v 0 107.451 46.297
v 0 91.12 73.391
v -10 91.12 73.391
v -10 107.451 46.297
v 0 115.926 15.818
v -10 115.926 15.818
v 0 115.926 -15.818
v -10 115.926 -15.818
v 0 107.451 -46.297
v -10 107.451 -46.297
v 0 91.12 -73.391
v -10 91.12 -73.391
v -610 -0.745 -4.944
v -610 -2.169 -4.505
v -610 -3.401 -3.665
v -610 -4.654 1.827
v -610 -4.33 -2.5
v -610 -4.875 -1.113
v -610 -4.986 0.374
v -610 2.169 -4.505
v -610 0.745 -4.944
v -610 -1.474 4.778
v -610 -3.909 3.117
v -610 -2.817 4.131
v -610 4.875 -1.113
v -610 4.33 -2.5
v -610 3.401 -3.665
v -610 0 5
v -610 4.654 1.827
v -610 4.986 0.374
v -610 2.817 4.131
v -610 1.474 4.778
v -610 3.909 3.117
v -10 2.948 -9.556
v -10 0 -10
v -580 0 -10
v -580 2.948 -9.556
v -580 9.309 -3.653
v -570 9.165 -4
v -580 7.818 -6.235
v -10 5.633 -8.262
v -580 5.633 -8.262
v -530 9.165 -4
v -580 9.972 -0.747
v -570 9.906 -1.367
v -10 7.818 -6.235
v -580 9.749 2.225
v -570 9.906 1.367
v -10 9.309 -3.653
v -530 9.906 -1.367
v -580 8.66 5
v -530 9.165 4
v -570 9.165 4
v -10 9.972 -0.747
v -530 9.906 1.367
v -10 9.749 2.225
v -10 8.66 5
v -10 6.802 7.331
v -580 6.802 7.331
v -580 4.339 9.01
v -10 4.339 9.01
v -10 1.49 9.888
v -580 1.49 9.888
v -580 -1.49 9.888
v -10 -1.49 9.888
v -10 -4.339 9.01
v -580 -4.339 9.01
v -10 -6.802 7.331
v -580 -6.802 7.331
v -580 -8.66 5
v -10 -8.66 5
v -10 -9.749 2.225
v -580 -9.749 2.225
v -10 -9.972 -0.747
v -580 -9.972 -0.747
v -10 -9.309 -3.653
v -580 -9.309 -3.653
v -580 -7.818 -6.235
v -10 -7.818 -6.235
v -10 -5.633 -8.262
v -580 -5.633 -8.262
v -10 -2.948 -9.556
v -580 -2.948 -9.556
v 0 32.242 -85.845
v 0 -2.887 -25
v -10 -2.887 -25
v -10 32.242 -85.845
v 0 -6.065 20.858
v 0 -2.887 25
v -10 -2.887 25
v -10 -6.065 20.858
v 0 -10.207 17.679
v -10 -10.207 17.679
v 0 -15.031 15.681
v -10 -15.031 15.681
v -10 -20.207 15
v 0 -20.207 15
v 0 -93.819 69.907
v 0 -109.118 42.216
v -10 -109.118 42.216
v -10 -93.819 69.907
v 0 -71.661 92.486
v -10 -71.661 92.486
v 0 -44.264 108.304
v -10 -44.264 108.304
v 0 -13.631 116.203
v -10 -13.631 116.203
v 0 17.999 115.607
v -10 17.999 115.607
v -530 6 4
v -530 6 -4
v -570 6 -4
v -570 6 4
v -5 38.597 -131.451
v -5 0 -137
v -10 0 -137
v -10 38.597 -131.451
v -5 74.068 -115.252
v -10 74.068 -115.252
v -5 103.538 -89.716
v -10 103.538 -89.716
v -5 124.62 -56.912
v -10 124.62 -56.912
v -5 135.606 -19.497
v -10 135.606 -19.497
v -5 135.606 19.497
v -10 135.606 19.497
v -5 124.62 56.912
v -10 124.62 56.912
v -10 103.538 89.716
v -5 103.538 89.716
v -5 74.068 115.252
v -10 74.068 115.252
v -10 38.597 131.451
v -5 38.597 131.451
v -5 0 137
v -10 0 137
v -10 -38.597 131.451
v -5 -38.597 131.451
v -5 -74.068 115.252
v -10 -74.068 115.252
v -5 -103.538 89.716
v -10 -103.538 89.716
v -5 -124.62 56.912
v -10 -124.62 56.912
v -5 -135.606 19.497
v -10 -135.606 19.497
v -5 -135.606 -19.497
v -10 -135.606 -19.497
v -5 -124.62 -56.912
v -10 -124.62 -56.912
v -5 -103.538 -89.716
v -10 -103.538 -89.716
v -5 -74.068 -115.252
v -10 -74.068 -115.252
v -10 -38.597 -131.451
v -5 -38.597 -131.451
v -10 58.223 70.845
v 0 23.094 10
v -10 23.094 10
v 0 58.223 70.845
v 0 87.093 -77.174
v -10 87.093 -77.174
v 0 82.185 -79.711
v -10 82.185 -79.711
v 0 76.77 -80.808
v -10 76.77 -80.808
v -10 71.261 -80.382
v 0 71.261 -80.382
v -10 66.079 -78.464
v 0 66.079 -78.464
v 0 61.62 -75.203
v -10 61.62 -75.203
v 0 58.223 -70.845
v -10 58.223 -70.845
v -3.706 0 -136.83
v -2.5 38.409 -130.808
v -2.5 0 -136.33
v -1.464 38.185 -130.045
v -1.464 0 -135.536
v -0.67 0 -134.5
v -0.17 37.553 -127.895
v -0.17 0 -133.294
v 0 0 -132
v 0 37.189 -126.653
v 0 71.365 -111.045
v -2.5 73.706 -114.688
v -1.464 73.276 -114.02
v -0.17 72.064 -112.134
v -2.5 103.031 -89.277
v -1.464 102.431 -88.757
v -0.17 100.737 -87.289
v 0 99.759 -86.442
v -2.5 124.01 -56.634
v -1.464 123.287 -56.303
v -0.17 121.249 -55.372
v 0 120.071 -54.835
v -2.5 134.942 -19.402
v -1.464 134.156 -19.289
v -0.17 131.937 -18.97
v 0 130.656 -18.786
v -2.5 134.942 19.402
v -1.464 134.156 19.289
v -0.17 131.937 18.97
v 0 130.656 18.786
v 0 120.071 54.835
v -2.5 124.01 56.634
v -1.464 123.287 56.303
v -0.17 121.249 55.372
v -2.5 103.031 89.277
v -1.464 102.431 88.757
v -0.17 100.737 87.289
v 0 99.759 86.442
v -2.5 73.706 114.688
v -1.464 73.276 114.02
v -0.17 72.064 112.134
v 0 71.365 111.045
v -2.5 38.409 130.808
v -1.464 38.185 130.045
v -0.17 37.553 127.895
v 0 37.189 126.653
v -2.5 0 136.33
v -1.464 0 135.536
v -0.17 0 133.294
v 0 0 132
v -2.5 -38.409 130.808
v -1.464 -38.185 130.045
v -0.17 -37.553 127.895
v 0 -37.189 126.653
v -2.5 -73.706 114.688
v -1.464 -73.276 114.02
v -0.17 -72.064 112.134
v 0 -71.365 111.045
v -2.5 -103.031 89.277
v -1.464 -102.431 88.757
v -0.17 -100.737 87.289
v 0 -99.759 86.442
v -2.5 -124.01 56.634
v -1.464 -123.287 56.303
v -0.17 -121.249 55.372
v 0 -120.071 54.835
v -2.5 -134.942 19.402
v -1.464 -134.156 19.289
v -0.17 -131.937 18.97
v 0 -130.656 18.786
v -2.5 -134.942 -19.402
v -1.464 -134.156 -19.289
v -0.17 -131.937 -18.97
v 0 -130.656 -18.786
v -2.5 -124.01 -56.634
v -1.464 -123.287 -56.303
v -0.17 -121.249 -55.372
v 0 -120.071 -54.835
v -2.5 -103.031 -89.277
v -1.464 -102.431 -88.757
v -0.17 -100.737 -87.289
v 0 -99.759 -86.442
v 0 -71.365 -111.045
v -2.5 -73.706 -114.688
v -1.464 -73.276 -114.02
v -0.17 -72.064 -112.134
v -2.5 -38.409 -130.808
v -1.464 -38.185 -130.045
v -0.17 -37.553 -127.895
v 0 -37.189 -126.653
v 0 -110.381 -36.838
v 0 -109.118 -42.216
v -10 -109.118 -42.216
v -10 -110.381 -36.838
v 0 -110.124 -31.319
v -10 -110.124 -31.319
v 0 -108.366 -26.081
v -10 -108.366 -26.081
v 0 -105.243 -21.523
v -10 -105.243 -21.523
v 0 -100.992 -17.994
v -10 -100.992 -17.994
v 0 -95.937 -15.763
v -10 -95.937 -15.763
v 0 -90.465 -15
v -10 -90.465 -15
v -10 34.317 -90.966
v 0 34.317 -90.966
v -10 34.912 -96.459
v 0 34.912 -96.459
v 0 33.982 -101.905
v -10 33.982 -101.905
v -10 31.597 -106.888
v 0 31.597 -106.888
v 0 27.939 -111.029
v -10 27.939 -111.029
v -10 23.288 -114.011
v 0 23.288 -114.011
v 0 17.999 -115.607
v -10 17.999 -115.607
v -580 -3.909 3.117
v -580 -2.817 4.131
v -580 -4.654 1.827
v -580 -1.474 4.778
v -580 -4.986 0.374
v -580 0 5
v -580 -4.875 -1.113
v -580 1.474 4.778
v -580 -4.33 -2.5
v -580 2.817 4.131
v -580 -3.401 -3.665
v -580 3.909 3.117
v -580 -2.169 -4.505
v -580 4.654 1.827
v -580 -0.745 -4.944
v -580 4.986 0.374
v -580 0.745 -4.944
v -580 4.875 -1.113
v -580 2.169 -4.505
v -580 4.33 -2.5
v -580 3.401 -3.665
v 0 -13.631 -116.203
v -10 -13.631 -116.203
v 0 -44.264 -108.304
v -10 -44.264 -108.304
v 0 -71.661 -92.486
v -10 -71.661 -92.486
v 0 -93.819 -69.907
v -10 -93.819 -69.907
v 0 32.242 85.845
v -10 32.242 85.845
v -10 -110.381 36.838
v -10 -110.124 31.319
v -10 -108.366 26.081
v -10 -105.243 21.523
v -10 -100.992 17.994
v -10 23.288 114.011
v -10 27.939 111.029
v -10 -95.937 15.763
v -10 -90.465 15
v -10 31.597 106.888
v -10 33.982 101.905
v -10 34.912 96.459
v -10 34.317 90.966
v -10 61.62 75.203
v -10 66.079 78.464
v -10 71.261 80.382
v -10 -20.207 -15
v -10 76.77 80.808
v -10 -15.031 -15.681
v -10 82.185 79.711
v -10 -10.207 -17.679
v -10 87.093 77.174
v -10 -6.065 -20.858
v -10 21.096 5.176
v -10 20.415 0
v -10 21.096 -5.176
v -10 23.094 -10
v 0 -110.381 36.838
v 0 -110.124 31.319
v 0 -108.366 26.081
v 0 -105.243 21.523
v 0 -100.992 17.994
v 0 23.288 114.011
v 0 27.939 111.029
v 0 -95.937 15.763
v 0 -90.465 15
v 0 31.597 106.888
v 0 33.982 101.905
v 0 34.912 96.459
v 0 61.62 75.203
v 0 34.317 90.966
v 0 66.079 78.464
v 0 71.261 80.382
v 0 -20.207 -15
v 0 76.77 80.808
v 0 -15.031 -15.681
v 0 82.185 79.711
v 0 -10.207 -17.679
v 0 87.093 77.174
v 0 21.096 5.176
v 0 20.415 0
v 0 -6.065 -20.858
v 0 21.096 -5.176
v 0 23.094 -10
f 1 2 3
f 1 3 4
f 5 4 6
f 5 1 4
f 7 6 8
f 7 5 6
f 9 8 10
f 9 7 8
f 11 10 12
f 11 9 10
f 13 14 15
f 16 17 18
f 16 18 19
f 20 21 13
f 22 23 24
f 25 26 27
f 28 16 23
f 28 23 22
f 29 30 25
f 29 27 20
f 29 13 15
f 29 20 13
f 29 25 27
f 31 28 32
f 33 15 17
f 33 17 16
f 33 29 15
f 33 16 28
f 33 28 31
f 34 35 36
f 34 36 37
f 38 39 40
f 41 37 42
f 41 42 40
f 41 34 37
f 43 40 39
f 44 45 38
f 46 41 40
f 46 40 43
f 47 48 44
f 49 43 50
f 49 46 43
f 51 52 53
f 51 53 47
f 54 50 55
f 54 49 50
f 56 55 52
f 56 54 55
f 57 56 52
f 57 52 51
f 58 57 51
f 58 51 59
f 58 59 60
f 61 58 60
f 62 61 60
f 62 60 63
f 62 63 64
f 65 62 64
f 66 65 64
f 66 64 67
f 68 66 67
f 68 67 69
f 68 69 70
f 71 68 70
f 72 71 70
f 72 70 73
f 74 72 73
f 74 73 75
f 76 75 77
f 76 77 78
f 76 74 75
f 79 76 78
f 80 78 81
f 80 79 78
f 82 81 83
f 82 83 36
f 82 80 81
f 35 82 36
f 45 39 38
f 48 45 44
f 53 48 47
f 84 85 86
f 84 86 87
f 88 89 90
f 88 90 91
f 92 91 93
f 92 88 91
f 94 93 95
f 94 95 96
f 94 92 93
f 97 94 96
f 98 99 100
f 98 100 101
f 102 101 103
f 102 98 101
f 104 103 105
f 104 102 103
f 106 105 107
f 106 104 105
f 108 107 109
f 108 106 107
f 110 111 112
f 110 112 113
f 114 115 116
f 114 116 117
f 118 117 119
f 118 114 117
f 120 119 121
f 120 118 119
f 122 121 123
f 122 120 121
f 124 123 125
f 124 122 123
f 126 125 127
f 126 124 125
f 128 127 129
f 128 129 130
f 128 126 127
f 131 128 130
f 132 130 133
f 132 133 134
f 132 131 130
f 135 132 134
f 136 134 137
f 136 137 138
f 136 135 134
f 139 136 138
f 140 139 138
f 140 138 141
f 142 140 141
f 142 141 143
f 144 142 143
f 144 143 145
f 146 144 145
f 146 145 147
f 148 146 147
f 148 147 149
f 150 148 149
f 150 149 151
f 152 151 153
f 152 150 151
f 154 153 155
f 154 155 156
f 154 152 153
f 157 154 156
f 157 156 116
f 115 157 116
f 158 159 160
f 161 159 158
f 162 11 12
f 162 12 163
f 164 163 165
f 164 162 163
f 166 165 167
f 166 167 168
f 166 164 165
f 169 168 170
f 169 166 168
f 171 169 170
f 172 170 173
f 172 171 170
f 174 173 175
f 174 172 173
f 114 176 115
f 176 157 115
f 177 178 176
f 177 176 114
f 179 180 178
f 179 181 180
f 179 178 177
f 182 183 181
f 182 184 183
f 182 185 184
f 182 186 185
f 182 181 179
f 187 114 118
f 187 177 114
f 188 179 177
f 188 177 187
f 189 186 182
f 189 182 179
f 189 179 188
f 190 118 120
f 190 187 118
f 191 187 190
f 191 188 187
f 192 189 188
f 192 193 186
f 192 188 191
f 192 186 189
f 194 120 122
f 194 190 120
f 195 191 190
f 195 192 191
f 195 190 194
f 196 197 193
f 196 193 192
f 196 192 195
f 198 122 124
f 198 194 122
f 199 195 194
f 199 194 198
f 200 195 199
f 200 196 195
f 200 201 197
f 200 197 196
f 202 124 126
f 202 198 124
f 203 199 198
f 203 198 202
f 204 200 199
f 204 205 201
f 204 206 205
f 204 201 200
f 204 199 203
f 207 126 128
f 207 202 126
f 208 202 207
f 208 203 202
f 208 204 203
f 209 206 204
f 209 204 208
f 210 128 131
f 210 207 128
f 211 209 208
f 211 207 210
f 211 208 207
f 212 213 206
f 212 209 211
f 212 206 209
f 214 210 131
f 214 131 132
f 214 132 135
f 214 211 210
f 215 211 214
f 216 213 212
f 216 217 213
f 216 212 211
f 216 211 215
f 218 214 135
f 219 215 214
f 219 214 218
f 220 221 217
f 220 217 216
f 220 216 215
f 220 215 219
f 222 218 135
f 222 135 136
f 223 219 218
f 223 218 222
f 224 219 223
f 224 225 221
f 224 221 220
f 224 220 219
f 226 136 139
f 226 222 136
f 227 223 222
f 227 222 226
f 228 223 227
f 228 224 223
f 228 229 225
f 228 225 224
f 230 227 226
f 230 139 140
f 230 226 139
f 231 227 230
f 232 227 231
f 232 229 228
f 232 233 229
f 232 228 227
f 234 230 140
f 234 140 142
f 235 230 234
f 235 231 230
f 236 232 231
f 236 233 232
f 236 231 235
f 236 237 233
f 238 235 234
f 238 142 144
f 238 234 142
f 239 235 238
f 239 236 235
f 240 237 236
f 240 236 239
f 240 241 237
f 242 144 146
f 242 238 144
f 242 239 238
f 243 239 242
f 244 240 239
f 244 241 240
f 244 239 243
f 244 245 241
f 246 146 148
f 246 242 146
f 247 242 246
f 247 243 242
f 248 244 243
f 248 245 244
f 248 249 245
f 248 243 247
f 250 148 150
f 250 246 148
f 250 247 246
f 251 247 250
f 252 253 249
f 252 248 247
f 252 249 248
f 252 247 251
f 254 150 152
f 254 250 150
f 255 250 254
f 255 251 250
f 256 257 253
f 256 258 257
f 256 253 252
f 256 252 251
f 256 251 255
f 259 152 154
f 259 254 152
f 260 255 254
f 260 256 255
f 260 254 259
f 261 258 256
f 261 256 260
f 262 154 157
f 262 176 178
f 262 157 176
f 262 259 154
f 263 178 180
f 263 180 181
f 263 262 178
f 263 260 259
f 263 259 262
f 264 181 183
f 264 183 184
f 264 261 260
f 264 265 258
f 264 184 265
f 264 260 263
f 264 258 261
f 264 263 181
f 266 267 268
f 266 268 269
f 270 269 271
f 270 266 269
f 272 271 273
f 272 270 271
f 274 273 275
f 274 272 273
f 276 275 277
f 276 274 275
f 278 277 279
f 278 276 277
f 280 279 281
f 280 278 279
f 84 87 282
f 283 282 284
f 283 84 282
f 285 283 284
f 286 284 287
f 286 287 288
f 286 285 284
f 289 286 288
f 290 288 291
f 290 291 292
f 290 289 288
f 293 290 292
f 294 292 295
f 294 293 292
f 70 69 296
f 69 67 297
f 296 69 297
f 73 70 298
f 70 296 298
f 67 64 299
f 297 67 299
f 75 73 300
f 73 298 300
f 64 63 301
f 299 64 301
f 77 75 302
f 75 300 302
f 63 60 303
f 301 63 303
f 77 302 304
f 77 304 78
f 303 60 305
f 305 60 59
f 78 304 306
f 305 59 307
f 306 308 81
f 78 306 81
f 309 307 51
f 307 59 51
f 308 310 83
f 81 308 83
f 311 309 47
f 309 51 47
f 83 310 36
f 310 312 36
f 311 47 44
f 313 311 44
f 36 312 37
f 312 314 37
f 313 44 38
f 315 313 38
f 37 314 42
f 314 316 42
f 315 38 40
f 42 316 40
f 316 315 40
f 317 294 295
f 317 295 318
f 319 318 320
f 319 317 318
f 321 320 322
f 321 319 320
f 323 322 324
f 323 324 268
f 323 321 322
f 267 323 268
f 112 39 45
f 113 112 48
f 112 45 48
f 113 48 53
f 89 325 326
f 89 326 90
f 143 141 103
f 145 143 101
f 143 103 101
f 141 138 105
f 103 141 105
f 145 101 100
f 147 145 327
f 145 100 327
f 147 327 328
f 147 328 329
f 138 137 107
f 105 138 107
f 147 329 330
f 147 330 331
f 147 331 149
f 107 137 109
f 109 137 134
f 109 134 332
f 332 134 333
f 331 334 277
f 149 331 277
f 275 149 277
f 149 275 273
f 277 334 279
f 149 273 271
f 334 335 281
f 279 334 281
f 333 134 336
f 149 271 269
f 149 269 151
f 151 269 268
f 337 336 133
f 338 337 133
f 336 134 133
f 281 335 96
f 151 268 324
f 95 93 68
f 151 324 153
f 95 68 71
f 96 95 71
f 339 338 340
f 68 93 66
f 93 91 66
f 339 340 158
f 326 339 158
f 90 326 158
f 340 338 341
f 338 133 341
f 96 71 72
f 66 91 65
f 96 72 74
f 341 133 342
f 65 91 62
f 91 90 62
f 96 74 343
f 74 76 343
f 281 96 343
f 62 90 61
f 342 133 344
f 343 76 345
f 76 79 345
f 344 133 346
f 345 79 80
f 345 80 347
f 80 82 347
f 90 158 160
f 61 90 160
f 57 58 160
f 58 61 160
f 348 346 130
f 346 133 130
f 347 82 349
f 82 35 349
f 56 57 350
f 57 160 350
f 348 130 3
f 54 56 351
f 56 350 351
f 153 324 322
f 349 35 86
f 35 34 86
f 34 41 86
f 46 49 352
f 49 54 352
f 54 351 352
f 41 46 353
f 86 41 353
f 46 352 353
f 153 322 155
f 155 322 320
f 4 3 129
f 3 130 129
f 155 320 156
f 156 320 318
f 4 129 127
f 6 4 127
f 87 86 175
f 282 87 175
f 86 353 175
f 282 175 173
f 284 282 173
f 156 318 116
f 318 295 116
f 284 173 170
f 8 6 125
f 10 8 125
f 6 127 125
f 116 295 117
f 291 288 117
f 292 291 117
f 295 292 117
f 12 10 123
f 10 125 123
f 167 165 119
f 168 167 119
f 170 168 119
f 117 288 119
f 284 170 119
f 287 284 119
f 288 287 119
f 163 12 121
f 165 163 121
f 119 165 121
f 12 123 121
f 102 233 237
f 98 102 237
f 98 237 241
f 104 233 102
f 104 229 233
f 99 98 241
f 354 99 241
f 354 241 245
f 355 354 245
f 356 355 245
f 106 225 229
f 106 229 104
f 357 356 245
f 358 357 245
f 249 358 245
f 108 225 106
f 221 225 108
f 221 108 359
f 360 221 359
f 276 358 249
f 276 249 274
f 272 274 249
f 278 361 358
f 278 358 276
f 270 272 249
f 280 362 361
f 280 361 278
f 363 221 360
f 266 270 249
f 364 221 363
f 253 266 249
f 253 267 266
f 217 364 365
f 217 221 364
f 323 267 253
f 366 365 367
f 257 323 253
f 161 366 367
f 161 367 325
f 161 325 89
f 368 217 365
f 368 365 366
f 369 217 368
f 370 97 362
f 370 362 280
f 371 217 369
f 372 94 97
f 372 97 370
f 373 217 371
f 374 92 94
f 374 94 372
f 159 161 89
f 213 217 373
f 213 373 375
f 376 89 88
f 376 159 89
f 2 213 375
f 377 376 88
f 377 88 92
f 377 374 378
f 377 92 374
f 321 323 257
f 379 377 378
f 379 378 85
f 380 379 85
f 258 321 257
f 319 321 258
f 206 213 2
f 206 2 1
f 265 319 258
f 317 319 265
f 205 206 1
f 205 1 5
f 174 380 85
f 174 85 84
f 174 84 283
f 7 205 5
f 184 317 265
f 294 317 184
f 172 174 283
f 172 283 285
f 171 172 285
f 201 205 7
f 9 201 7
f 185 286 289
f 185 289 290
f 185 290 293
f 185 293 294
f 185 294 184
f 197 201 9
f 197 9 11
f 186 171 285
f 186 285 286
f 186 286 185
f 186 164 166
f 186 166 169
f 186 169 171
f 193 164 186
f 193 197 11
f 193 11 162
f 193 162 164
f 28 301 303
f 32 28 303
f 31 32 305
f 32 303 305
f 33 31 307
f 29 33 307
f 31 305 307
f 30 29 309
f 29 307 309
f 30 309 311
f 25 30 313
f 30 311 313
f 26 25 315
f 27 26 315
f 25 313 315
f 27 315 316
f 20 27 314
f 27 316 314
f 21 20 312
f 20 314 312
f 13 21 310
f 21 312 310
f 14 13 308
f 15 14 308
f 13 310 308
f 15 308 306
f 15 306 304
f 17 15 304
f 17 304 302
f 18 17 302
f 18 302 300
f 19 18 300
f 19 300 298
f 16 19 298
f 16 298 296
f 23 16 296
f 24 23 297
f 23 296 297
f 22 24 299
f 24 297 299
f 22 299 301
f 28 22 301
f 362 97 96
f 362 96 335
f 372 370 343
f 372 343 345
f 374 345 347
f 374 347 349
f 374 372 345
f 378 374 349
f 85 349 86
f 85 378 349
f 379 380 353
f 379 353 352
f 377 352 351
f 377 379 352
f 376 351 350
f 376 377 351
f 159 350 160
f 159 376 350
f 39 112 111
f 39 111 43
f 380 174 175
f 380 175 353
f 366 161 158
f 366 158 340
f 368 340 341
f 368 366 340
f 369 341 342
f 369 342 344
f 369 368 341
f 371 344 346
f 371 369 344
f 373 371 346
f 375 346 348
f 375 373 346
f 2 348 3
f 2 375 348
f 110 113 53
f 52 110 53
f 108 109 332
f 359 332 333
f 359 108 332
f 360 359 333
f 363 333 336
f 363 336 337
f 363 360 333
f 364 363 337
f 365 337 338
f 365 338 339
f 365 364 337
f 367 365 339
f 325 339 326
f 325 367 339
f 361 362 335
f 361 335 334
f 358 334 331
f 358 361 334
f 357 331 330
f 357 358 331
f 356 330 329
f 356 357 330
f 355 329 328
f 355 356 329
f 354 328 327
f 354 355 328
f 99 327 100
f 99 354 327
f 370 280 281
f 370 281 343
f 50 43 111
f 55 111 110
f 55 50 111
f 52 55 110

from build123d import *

# Parameters (mm, degrees)
SKETCH2_R           = 10
BOSS_EXTRUDE1_DEPTH = 580
SKETCH3_R           = 5
BOSS_EXTRUDE2_DEPTH = 30
CUT_EXTRUDE1_START  = -10
SKETCH8_W           = 8
SKETCH8_H           = 8
CUT_EXTRUDE1_DEPTH  = 40
SKETCH7_R           = 137
BOSS_EXTRUDE7_DEPTH = 10
FILLET1_R           = 5


with BuildPart() as part:
    # Sketch2 → Boss-Extrude1 (new body)
    with BuildSketch(Plane(origin=(0, 0, 0), x_dir=(0, 0, -1), z_dir=(1, 0, 0))):
        Circle(SKETCH2_R)
    extrude(amount=-BOSS_EXTRUDE1_DEPTH)

    # Sketch3 → Boss-Extrude2 (add)
    with BuildSketch(Plane.ZY.offset(580)):
        Circle(SKETCH3_R)
    extrude(amount=BOSS_EXTRUDE2_DEPTH)

    # Sketch8 → Cut-Extrude1 (cut)
    with BuildSketch(Plane.ZY.offset(580).offset(CUT_EXTRUDE1_START)):
        with Locations((0, 10)):
            Rectangle(SKETCH8_W, SKETCH8_H)
    extrude(amount=-CUT_EXTRUDE1_DEPTH, mode=Mode.SUBTRACT)

    # Sketch7 → Boss-Extrude7 (add)
    with BuildSketch(Plane(origin=(0, 0, 0), x_dir=(0, 0, -1), z_dir=(1, 0, 0))):
        Circle(SKETCH7_R)
        with BuildLine():
            Line((-10, 23.094010768), (-70.845389143, 58.223112568))
            ThreePointArc((-70.845389143, 58.223112568), (-80.785784301, 74.000688066), (-73.390830204, 91.119624901))
            ThreePointArc((-73.390830204, 91.119624901), (0, 117), (73.390830204, 91.119624901))
            ThreePointArc((73.390830204, 91.119624901), (80.785784301, 74.000688066), (70.845389143, 58.223112568))
            Line((70.845389143, 58.223112568), (10, 23.094010768))
            ThreePointArc((10, 23.094010768), (0, 20.414518843), (-10, 23.094010768))
        make_face(mode=Mode.SUBTRACT)
        with BuildLine():
            Line((-15, -20.207259422), (-15, -90.465463023))
            ThreePointArc((-15, -90.465463023), (-23.693583612, -106.962885502), (-42.216494845, -109.118135811))
            ThreePointArc((-42.216494845, -109.118135811), (-101.324972243, -58.5), (-115.607325049, 17.998510911))
            ThreePointArc((-115.607325049, 17.998510911), (-104.479367913, 32.962197437), (-85.845389143, 32.242350455))
            Line((-85.845389143, 32.242350455), (-25, -2.886751346))
            ThreePointArc((-25, -2.886751346), (-17.679491924, -10.207259422), (-15, -20.207259422))
        make_face(mode=Mode.SUBTRACT)
        with BuildLine():
            Line((25, -2.886751346), (85.845389143, 32.242350455))
            ThreePointArc((85.845389143, 32.242350455), (104.479367913, 32.962197437), (115.607325049, 17.998510911))
            ThreePointArc((115.607325049, 17.998510911), (101.324972243, -58.5), (42.216494845, -109.118135811))
            ThreePointArc((42.216494845, -109.118135811), (23.693583612, -106.962885502), (15, -90.465463023))
            Line((15, -90.465463023), (15, -20.207259422))
            ThreePointArc((15, -20.207259422), (17.679491924, -10.207259422), (25, -2.886751346))
        make_face(mode=Mode.SUBTRACT)
    extrude(amount=-BOSS_EXTRUDE7_DEPTH)

    # Fillet1
    fillet1_edges = [part.edges().sort_by_distance(p)[0] for p in [
        (0, 0, 137),
    ]]
    fillet(fillet1_edges, radius=FILLET1_R)


solid = part.part
